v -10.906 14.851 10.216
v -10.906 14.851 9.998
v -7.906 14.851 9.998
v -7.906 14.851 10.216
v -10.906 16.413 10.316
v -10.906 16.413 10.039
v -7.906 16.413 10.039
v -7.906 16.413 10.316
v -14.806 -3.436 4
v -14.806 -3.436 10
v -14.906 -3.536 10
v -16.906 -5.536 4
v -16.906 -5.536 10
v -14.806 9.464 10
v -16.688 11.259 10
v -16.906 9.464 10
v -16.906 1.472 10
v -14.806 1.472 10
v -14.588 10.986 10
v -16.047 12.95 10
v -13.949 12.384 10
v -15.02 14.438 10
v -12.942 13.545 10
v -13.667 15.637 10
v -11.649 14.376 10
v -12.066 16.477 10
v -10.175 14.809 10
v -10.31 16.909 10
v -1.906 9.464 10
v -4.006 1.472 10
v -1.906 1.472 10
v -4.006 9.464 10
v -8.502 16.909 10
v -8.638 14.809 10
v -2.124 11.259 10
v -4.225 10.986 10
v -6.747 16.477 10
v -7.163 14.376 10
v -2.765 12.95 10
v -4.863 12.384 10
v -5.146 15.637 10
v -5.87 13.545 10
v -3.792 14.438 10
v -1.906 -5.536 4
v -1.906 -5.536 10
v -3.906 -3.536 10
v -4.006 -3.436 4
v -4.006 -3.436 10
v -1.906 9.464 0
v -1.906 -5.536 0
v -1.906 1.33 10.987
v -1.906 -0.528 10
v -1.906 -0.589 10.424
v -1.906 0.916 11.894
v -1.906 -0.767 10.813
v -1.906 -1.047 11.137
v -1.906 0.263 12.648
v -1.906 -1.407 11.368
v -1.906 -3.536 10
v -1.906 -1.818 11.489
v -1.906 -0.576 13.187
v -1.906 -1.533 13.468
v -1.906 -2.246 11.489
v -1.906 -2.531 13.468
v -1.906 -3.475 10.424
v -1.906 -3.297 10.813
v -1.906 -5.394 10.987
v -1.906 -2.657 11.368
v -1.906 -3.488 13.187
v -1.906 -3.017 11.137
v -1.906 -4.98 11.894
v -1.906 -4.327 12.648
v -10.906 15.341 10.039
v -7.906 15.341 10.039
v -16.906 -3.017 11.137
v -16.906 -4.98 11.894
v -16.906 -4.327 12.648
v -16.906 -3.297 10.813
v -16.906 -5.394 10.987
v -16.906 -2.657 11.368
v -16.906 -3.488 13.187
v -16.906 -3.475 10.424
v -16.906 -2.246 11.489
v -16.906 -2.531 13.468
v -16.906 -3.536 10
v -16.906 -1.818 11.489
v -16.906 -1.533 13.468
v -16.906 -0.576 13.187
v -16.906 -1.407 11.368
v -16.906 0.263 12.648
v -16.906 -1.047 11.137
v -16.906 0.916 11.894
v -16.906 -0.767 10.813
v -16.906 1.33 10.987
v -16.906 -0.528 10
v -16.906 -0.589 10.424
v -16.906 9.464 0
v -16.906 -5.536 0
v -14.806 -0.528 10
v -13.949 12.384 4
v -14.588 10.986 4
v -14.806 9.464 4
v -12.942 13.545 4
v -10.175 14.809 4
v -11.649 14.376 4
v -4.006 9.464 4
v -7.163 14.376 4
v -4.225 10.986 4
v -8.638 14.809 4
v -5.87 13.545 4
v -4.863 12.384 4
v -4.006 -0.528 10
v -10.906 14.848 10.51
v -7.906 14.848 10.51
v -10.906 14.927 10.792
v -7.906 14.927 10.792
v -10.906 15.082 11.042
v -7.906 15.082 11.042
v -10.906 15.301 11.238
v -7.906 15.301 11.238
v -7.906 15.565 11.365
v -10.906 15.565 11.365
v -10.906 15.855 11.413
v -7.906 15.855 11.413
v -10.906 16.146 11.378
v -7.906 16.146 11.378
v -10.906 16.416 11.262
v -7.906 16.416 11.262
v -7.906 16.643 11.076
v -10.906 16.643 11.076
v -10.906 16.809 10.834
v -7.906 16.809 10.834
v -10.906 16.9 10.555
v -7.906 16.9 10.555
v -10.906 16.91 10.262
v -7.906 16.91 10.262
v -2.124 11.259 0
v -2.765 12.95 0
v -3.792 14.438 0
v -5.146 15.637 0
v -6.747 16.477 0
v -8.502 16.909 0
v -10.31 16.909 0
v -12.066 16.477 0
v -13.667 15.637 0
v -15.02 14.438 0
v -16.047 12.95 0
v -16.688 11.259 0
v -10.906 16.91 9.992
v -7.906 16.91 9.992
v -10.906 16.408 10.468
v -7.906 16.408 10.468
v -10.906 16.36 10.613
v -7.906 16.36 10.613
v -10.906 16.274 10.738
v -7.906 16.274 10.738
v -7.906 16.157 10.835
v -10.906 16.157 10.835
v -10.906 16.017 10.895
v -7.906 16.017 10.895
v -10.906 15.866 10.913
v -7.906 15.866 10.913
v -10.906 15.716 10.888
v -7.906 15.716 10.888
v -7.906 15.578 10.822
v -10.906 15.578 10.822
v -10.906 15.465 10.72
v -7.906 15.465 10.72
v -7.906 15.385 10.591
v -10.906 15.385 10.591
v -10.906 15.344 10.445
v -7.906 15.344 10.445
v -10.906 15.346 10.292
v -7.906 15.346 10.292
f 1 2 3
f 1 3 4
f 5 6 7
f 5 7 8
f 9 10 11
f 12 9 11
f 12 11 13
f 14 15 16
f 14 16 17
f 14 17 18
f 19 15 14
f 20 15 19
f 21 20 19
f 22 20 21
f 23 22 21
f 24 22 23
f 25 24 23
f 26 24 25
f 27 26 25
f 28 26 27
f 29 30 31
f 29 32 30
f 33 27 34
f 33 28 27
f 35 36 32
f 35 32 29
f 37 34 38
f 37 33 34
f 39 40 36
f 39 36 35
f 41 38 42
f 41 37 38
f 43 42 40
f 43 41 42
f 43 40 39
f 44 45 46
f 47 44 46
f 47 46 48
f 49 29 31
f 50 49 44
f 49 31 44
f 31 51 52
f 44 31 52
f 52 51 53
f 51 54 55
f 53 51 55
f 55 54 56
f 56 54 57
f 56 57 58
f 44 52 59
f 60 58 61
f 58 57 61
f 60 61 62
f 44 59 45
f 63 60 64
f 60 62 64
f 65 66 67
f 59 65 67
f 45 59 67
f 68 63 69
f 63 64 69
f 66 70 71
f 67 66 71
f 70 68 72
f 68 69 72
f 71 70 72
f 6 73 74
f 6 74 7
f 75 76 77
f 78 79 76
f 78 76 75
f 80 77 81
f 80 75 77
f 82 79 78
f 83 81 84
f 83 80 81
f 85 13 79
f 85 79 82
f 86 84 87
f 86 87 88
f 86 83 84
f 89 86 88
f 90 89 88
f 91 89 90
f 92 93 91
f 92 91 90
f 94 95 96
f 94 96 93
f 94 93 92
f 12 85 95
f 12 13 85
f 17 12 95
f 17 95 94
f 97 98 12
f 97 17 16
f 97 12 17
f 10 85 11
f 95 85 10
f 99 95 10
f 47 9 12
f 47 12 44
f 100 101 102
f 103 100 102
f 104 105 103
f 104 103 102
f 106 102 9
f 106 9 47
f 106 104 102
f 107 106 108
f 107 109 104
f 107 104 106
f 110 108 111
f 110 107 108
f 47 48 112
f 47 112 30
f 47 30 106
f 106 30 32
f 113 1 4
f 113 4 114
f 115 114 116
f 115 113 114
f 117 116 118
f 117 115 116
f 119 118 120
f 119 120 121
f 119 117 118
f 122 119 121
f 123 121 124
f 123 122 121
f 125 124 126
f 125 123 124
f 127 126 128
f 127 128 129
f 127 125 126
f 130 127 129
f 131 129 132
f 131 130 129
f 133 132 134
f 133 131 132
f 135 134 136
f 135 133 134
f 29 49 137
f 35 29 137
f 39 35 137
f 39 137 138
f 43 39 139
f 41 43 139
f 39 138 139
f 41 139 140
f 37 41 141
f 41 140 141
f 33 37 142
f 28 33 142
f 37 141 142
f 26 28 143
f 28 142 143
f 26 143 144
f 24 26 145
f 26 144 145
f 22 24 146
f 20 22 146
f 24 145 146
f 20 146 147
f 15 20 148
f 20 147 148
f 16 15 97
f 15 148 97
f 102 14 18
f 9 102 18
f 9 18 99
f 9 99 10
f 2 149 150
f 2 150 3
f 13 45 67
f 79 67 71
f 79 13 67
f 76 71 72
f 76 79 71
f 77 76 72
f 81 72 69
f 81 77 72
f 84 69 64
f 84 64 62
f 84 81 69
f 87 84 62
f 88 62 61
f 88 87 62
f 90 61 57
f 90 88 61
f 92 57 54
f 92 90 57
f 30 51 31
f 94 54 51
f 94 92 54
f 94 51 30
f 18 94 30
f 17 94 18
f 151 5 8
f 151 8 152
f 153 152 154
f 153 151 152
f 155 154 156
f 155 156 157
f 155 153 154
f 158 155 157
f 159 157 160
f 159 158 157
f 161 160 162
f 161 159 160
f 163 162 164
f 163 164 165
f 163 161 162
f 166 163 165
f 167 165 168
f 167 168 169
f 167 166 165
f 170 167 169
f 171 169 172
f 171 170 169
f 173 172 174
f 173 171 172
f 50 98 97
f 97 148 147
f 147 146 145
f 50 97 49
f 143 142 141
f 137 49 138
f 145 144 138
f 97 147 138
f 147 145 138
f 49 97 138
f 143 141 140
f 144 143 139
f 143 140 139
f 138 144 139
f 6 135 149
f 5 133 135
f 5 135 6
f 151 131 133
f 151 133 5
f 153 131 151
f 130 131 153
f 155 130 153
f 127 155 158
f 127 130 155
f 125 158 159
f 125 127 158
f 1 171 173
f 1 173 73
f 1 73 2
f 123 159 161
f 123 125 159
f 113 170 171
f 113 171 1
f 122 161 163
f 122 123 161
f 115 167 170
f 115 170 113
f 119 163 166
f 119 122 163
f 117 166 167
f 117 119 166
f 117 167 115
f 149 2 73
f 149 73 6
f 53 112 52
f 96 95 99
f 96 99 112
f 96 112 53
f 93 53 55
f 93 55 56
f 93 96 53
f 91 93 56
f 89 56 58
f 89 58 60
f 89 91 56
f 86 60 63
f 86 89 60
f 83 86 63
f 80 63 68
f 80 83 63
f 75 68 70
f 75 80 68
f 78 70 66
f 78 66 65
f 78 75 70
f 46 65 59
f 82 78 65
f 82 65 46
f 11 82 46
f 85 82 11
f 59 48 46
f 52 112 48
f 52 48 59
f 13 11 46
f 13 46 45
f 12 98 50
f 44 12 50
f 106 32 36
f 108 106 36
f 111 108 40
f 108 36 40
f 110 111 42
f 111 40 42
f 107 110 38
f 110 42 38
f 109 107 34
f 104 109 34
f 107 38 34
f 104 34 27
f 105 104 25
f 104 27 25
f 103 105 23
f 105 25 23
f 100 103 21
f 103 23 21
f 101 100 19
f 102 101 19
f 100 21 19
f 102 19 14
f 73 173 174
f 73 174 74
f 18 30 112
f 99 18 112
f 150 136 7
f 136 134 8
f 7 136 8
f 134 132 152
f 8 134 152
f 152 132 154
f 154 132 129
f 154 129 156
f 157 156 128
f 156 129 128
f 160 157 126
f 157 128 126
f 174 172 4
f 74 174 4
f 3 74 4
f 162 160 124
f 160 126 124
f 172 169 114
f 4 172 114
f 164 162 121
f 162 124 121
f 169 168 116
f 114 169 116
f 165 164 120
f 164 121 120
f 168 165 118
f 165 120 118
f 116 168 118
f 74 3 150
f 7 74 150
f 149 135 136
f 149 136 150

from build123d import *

# Parameters (mm, degrees)
F0_W     = 15
F0_H     = 15
F1_DEPTH = 10
F3_DEPTH = 6
F5_DEPTH = 15
F8_DEPTH = 3


with BuildPart() as f1:
    # F0 (on Top) → F1 (new body)
    with BuildSketch(Plane.XY):
        with BuildLine():
            ThreePointArc((-1.906250203, 9.464154976), (-9.406250203, 16.964154976), (-16.906250203, 9.464154976))
            Line((-16.906250203, 9.464154976), (-1.906250203, 9.464154976))
        make_face()
        with Locations((-9.406250203, 1.964154976)):
            Rectangle(F0_W, F0_H)
    extrude(amount=F1_DEPTH)

    # F2 (on face) → F3 (cut)
    with BuildSketch(Plane.XY.offset(10)):
        with BuildLine():
            ThreePointArc((-4.006250203, 9.464154976), (-9.406250203, 14.864154976), (-14.806250203, 9.464154976))
            Line((-14.806250203, 9.464154976), (-14.806250203, -3.435845024))
            Line((-14.806250203, -3.435845024), (-16.906250203, -5.535845024))
            Line((-16.906250203, -5.535845024), (-1.906250203, -5.535845024))
            Line((-1.906250203, -5.535845024), (-4.006250203, -3.435845024))
            Line((-4.006250203, -3.435845024), (-4.006250203, 9.464154976))
        make_face()
    extrude(amount=-F3_DEPTH, mode=Mode.SUBTRACT)

    # F4 (on face) → F5 (join, through all)
    with BuildSketch(Plane(origin=(-16.906250203, 0, 0), x_dir=(0, -1, 0), z_dir=(-1, 0, 0))):
        with BuildLine():
            Line((3.5358449577, 10), (5.535845024, 10))
            ThreePointArc((5.535845024, 10), (2.0319389684, 13.5039060556), (-1.4719670871, 10))
            Line((-1.4719670871, 10), (0.5280329792, 10))
            ThreePointArc((0.5280329792, 10), (2.0319389684, 11.5039059892), (3.5358449577, 10))
        make_face()
    extrude(amount=-F5_DEPTH)


with BuildPart() as f8:
    # F7 (on offset) → F8 (new body)
    with BuildSketch(Plane(origin=(-10.906250203, 0, 0), x_dir=(0, -1, 0), z_dir=(-1, 0, 0))):
        with BuildLine():
            Line((-14.8514312825, 9.9982069805), (-14.8514312825, 10.2163447095))
            ThreePointArc((-14.8514312825, 10.2163447095), (-15.854696957, 11.4125768297), (-16.9100019791, 10.2619923655))
            Line((-16.9100019791, 10.2619923655), (-16.9100019791, 9.9924588576))
            Line((-16.9100019791, 9.9924588576), (-14.8514312825, 9.9982069805))
        make_face()
        with BuildLine():
            ThreePointArc((-16.4129423483, 10.3161377574), (-15.865781453, 10.9126997109), (-15.3456022317, 10.2924700861))
            Line((-15.3456022317, 10.2924700861), (-15.3409130871, 10.0394133478))
            Line((-15.3409130871, 10.0394133478), (-16.4129423483, 10.0394133478))
            Line((-16.4129423483, 10.0394133478), (-16.4129423483, 10.3161377574))
        make_face(mode=Mode.SUBTRACT)
    extrude(amount=-F8_DEPTH)


solid = Compound([f1.part, f8.part])
